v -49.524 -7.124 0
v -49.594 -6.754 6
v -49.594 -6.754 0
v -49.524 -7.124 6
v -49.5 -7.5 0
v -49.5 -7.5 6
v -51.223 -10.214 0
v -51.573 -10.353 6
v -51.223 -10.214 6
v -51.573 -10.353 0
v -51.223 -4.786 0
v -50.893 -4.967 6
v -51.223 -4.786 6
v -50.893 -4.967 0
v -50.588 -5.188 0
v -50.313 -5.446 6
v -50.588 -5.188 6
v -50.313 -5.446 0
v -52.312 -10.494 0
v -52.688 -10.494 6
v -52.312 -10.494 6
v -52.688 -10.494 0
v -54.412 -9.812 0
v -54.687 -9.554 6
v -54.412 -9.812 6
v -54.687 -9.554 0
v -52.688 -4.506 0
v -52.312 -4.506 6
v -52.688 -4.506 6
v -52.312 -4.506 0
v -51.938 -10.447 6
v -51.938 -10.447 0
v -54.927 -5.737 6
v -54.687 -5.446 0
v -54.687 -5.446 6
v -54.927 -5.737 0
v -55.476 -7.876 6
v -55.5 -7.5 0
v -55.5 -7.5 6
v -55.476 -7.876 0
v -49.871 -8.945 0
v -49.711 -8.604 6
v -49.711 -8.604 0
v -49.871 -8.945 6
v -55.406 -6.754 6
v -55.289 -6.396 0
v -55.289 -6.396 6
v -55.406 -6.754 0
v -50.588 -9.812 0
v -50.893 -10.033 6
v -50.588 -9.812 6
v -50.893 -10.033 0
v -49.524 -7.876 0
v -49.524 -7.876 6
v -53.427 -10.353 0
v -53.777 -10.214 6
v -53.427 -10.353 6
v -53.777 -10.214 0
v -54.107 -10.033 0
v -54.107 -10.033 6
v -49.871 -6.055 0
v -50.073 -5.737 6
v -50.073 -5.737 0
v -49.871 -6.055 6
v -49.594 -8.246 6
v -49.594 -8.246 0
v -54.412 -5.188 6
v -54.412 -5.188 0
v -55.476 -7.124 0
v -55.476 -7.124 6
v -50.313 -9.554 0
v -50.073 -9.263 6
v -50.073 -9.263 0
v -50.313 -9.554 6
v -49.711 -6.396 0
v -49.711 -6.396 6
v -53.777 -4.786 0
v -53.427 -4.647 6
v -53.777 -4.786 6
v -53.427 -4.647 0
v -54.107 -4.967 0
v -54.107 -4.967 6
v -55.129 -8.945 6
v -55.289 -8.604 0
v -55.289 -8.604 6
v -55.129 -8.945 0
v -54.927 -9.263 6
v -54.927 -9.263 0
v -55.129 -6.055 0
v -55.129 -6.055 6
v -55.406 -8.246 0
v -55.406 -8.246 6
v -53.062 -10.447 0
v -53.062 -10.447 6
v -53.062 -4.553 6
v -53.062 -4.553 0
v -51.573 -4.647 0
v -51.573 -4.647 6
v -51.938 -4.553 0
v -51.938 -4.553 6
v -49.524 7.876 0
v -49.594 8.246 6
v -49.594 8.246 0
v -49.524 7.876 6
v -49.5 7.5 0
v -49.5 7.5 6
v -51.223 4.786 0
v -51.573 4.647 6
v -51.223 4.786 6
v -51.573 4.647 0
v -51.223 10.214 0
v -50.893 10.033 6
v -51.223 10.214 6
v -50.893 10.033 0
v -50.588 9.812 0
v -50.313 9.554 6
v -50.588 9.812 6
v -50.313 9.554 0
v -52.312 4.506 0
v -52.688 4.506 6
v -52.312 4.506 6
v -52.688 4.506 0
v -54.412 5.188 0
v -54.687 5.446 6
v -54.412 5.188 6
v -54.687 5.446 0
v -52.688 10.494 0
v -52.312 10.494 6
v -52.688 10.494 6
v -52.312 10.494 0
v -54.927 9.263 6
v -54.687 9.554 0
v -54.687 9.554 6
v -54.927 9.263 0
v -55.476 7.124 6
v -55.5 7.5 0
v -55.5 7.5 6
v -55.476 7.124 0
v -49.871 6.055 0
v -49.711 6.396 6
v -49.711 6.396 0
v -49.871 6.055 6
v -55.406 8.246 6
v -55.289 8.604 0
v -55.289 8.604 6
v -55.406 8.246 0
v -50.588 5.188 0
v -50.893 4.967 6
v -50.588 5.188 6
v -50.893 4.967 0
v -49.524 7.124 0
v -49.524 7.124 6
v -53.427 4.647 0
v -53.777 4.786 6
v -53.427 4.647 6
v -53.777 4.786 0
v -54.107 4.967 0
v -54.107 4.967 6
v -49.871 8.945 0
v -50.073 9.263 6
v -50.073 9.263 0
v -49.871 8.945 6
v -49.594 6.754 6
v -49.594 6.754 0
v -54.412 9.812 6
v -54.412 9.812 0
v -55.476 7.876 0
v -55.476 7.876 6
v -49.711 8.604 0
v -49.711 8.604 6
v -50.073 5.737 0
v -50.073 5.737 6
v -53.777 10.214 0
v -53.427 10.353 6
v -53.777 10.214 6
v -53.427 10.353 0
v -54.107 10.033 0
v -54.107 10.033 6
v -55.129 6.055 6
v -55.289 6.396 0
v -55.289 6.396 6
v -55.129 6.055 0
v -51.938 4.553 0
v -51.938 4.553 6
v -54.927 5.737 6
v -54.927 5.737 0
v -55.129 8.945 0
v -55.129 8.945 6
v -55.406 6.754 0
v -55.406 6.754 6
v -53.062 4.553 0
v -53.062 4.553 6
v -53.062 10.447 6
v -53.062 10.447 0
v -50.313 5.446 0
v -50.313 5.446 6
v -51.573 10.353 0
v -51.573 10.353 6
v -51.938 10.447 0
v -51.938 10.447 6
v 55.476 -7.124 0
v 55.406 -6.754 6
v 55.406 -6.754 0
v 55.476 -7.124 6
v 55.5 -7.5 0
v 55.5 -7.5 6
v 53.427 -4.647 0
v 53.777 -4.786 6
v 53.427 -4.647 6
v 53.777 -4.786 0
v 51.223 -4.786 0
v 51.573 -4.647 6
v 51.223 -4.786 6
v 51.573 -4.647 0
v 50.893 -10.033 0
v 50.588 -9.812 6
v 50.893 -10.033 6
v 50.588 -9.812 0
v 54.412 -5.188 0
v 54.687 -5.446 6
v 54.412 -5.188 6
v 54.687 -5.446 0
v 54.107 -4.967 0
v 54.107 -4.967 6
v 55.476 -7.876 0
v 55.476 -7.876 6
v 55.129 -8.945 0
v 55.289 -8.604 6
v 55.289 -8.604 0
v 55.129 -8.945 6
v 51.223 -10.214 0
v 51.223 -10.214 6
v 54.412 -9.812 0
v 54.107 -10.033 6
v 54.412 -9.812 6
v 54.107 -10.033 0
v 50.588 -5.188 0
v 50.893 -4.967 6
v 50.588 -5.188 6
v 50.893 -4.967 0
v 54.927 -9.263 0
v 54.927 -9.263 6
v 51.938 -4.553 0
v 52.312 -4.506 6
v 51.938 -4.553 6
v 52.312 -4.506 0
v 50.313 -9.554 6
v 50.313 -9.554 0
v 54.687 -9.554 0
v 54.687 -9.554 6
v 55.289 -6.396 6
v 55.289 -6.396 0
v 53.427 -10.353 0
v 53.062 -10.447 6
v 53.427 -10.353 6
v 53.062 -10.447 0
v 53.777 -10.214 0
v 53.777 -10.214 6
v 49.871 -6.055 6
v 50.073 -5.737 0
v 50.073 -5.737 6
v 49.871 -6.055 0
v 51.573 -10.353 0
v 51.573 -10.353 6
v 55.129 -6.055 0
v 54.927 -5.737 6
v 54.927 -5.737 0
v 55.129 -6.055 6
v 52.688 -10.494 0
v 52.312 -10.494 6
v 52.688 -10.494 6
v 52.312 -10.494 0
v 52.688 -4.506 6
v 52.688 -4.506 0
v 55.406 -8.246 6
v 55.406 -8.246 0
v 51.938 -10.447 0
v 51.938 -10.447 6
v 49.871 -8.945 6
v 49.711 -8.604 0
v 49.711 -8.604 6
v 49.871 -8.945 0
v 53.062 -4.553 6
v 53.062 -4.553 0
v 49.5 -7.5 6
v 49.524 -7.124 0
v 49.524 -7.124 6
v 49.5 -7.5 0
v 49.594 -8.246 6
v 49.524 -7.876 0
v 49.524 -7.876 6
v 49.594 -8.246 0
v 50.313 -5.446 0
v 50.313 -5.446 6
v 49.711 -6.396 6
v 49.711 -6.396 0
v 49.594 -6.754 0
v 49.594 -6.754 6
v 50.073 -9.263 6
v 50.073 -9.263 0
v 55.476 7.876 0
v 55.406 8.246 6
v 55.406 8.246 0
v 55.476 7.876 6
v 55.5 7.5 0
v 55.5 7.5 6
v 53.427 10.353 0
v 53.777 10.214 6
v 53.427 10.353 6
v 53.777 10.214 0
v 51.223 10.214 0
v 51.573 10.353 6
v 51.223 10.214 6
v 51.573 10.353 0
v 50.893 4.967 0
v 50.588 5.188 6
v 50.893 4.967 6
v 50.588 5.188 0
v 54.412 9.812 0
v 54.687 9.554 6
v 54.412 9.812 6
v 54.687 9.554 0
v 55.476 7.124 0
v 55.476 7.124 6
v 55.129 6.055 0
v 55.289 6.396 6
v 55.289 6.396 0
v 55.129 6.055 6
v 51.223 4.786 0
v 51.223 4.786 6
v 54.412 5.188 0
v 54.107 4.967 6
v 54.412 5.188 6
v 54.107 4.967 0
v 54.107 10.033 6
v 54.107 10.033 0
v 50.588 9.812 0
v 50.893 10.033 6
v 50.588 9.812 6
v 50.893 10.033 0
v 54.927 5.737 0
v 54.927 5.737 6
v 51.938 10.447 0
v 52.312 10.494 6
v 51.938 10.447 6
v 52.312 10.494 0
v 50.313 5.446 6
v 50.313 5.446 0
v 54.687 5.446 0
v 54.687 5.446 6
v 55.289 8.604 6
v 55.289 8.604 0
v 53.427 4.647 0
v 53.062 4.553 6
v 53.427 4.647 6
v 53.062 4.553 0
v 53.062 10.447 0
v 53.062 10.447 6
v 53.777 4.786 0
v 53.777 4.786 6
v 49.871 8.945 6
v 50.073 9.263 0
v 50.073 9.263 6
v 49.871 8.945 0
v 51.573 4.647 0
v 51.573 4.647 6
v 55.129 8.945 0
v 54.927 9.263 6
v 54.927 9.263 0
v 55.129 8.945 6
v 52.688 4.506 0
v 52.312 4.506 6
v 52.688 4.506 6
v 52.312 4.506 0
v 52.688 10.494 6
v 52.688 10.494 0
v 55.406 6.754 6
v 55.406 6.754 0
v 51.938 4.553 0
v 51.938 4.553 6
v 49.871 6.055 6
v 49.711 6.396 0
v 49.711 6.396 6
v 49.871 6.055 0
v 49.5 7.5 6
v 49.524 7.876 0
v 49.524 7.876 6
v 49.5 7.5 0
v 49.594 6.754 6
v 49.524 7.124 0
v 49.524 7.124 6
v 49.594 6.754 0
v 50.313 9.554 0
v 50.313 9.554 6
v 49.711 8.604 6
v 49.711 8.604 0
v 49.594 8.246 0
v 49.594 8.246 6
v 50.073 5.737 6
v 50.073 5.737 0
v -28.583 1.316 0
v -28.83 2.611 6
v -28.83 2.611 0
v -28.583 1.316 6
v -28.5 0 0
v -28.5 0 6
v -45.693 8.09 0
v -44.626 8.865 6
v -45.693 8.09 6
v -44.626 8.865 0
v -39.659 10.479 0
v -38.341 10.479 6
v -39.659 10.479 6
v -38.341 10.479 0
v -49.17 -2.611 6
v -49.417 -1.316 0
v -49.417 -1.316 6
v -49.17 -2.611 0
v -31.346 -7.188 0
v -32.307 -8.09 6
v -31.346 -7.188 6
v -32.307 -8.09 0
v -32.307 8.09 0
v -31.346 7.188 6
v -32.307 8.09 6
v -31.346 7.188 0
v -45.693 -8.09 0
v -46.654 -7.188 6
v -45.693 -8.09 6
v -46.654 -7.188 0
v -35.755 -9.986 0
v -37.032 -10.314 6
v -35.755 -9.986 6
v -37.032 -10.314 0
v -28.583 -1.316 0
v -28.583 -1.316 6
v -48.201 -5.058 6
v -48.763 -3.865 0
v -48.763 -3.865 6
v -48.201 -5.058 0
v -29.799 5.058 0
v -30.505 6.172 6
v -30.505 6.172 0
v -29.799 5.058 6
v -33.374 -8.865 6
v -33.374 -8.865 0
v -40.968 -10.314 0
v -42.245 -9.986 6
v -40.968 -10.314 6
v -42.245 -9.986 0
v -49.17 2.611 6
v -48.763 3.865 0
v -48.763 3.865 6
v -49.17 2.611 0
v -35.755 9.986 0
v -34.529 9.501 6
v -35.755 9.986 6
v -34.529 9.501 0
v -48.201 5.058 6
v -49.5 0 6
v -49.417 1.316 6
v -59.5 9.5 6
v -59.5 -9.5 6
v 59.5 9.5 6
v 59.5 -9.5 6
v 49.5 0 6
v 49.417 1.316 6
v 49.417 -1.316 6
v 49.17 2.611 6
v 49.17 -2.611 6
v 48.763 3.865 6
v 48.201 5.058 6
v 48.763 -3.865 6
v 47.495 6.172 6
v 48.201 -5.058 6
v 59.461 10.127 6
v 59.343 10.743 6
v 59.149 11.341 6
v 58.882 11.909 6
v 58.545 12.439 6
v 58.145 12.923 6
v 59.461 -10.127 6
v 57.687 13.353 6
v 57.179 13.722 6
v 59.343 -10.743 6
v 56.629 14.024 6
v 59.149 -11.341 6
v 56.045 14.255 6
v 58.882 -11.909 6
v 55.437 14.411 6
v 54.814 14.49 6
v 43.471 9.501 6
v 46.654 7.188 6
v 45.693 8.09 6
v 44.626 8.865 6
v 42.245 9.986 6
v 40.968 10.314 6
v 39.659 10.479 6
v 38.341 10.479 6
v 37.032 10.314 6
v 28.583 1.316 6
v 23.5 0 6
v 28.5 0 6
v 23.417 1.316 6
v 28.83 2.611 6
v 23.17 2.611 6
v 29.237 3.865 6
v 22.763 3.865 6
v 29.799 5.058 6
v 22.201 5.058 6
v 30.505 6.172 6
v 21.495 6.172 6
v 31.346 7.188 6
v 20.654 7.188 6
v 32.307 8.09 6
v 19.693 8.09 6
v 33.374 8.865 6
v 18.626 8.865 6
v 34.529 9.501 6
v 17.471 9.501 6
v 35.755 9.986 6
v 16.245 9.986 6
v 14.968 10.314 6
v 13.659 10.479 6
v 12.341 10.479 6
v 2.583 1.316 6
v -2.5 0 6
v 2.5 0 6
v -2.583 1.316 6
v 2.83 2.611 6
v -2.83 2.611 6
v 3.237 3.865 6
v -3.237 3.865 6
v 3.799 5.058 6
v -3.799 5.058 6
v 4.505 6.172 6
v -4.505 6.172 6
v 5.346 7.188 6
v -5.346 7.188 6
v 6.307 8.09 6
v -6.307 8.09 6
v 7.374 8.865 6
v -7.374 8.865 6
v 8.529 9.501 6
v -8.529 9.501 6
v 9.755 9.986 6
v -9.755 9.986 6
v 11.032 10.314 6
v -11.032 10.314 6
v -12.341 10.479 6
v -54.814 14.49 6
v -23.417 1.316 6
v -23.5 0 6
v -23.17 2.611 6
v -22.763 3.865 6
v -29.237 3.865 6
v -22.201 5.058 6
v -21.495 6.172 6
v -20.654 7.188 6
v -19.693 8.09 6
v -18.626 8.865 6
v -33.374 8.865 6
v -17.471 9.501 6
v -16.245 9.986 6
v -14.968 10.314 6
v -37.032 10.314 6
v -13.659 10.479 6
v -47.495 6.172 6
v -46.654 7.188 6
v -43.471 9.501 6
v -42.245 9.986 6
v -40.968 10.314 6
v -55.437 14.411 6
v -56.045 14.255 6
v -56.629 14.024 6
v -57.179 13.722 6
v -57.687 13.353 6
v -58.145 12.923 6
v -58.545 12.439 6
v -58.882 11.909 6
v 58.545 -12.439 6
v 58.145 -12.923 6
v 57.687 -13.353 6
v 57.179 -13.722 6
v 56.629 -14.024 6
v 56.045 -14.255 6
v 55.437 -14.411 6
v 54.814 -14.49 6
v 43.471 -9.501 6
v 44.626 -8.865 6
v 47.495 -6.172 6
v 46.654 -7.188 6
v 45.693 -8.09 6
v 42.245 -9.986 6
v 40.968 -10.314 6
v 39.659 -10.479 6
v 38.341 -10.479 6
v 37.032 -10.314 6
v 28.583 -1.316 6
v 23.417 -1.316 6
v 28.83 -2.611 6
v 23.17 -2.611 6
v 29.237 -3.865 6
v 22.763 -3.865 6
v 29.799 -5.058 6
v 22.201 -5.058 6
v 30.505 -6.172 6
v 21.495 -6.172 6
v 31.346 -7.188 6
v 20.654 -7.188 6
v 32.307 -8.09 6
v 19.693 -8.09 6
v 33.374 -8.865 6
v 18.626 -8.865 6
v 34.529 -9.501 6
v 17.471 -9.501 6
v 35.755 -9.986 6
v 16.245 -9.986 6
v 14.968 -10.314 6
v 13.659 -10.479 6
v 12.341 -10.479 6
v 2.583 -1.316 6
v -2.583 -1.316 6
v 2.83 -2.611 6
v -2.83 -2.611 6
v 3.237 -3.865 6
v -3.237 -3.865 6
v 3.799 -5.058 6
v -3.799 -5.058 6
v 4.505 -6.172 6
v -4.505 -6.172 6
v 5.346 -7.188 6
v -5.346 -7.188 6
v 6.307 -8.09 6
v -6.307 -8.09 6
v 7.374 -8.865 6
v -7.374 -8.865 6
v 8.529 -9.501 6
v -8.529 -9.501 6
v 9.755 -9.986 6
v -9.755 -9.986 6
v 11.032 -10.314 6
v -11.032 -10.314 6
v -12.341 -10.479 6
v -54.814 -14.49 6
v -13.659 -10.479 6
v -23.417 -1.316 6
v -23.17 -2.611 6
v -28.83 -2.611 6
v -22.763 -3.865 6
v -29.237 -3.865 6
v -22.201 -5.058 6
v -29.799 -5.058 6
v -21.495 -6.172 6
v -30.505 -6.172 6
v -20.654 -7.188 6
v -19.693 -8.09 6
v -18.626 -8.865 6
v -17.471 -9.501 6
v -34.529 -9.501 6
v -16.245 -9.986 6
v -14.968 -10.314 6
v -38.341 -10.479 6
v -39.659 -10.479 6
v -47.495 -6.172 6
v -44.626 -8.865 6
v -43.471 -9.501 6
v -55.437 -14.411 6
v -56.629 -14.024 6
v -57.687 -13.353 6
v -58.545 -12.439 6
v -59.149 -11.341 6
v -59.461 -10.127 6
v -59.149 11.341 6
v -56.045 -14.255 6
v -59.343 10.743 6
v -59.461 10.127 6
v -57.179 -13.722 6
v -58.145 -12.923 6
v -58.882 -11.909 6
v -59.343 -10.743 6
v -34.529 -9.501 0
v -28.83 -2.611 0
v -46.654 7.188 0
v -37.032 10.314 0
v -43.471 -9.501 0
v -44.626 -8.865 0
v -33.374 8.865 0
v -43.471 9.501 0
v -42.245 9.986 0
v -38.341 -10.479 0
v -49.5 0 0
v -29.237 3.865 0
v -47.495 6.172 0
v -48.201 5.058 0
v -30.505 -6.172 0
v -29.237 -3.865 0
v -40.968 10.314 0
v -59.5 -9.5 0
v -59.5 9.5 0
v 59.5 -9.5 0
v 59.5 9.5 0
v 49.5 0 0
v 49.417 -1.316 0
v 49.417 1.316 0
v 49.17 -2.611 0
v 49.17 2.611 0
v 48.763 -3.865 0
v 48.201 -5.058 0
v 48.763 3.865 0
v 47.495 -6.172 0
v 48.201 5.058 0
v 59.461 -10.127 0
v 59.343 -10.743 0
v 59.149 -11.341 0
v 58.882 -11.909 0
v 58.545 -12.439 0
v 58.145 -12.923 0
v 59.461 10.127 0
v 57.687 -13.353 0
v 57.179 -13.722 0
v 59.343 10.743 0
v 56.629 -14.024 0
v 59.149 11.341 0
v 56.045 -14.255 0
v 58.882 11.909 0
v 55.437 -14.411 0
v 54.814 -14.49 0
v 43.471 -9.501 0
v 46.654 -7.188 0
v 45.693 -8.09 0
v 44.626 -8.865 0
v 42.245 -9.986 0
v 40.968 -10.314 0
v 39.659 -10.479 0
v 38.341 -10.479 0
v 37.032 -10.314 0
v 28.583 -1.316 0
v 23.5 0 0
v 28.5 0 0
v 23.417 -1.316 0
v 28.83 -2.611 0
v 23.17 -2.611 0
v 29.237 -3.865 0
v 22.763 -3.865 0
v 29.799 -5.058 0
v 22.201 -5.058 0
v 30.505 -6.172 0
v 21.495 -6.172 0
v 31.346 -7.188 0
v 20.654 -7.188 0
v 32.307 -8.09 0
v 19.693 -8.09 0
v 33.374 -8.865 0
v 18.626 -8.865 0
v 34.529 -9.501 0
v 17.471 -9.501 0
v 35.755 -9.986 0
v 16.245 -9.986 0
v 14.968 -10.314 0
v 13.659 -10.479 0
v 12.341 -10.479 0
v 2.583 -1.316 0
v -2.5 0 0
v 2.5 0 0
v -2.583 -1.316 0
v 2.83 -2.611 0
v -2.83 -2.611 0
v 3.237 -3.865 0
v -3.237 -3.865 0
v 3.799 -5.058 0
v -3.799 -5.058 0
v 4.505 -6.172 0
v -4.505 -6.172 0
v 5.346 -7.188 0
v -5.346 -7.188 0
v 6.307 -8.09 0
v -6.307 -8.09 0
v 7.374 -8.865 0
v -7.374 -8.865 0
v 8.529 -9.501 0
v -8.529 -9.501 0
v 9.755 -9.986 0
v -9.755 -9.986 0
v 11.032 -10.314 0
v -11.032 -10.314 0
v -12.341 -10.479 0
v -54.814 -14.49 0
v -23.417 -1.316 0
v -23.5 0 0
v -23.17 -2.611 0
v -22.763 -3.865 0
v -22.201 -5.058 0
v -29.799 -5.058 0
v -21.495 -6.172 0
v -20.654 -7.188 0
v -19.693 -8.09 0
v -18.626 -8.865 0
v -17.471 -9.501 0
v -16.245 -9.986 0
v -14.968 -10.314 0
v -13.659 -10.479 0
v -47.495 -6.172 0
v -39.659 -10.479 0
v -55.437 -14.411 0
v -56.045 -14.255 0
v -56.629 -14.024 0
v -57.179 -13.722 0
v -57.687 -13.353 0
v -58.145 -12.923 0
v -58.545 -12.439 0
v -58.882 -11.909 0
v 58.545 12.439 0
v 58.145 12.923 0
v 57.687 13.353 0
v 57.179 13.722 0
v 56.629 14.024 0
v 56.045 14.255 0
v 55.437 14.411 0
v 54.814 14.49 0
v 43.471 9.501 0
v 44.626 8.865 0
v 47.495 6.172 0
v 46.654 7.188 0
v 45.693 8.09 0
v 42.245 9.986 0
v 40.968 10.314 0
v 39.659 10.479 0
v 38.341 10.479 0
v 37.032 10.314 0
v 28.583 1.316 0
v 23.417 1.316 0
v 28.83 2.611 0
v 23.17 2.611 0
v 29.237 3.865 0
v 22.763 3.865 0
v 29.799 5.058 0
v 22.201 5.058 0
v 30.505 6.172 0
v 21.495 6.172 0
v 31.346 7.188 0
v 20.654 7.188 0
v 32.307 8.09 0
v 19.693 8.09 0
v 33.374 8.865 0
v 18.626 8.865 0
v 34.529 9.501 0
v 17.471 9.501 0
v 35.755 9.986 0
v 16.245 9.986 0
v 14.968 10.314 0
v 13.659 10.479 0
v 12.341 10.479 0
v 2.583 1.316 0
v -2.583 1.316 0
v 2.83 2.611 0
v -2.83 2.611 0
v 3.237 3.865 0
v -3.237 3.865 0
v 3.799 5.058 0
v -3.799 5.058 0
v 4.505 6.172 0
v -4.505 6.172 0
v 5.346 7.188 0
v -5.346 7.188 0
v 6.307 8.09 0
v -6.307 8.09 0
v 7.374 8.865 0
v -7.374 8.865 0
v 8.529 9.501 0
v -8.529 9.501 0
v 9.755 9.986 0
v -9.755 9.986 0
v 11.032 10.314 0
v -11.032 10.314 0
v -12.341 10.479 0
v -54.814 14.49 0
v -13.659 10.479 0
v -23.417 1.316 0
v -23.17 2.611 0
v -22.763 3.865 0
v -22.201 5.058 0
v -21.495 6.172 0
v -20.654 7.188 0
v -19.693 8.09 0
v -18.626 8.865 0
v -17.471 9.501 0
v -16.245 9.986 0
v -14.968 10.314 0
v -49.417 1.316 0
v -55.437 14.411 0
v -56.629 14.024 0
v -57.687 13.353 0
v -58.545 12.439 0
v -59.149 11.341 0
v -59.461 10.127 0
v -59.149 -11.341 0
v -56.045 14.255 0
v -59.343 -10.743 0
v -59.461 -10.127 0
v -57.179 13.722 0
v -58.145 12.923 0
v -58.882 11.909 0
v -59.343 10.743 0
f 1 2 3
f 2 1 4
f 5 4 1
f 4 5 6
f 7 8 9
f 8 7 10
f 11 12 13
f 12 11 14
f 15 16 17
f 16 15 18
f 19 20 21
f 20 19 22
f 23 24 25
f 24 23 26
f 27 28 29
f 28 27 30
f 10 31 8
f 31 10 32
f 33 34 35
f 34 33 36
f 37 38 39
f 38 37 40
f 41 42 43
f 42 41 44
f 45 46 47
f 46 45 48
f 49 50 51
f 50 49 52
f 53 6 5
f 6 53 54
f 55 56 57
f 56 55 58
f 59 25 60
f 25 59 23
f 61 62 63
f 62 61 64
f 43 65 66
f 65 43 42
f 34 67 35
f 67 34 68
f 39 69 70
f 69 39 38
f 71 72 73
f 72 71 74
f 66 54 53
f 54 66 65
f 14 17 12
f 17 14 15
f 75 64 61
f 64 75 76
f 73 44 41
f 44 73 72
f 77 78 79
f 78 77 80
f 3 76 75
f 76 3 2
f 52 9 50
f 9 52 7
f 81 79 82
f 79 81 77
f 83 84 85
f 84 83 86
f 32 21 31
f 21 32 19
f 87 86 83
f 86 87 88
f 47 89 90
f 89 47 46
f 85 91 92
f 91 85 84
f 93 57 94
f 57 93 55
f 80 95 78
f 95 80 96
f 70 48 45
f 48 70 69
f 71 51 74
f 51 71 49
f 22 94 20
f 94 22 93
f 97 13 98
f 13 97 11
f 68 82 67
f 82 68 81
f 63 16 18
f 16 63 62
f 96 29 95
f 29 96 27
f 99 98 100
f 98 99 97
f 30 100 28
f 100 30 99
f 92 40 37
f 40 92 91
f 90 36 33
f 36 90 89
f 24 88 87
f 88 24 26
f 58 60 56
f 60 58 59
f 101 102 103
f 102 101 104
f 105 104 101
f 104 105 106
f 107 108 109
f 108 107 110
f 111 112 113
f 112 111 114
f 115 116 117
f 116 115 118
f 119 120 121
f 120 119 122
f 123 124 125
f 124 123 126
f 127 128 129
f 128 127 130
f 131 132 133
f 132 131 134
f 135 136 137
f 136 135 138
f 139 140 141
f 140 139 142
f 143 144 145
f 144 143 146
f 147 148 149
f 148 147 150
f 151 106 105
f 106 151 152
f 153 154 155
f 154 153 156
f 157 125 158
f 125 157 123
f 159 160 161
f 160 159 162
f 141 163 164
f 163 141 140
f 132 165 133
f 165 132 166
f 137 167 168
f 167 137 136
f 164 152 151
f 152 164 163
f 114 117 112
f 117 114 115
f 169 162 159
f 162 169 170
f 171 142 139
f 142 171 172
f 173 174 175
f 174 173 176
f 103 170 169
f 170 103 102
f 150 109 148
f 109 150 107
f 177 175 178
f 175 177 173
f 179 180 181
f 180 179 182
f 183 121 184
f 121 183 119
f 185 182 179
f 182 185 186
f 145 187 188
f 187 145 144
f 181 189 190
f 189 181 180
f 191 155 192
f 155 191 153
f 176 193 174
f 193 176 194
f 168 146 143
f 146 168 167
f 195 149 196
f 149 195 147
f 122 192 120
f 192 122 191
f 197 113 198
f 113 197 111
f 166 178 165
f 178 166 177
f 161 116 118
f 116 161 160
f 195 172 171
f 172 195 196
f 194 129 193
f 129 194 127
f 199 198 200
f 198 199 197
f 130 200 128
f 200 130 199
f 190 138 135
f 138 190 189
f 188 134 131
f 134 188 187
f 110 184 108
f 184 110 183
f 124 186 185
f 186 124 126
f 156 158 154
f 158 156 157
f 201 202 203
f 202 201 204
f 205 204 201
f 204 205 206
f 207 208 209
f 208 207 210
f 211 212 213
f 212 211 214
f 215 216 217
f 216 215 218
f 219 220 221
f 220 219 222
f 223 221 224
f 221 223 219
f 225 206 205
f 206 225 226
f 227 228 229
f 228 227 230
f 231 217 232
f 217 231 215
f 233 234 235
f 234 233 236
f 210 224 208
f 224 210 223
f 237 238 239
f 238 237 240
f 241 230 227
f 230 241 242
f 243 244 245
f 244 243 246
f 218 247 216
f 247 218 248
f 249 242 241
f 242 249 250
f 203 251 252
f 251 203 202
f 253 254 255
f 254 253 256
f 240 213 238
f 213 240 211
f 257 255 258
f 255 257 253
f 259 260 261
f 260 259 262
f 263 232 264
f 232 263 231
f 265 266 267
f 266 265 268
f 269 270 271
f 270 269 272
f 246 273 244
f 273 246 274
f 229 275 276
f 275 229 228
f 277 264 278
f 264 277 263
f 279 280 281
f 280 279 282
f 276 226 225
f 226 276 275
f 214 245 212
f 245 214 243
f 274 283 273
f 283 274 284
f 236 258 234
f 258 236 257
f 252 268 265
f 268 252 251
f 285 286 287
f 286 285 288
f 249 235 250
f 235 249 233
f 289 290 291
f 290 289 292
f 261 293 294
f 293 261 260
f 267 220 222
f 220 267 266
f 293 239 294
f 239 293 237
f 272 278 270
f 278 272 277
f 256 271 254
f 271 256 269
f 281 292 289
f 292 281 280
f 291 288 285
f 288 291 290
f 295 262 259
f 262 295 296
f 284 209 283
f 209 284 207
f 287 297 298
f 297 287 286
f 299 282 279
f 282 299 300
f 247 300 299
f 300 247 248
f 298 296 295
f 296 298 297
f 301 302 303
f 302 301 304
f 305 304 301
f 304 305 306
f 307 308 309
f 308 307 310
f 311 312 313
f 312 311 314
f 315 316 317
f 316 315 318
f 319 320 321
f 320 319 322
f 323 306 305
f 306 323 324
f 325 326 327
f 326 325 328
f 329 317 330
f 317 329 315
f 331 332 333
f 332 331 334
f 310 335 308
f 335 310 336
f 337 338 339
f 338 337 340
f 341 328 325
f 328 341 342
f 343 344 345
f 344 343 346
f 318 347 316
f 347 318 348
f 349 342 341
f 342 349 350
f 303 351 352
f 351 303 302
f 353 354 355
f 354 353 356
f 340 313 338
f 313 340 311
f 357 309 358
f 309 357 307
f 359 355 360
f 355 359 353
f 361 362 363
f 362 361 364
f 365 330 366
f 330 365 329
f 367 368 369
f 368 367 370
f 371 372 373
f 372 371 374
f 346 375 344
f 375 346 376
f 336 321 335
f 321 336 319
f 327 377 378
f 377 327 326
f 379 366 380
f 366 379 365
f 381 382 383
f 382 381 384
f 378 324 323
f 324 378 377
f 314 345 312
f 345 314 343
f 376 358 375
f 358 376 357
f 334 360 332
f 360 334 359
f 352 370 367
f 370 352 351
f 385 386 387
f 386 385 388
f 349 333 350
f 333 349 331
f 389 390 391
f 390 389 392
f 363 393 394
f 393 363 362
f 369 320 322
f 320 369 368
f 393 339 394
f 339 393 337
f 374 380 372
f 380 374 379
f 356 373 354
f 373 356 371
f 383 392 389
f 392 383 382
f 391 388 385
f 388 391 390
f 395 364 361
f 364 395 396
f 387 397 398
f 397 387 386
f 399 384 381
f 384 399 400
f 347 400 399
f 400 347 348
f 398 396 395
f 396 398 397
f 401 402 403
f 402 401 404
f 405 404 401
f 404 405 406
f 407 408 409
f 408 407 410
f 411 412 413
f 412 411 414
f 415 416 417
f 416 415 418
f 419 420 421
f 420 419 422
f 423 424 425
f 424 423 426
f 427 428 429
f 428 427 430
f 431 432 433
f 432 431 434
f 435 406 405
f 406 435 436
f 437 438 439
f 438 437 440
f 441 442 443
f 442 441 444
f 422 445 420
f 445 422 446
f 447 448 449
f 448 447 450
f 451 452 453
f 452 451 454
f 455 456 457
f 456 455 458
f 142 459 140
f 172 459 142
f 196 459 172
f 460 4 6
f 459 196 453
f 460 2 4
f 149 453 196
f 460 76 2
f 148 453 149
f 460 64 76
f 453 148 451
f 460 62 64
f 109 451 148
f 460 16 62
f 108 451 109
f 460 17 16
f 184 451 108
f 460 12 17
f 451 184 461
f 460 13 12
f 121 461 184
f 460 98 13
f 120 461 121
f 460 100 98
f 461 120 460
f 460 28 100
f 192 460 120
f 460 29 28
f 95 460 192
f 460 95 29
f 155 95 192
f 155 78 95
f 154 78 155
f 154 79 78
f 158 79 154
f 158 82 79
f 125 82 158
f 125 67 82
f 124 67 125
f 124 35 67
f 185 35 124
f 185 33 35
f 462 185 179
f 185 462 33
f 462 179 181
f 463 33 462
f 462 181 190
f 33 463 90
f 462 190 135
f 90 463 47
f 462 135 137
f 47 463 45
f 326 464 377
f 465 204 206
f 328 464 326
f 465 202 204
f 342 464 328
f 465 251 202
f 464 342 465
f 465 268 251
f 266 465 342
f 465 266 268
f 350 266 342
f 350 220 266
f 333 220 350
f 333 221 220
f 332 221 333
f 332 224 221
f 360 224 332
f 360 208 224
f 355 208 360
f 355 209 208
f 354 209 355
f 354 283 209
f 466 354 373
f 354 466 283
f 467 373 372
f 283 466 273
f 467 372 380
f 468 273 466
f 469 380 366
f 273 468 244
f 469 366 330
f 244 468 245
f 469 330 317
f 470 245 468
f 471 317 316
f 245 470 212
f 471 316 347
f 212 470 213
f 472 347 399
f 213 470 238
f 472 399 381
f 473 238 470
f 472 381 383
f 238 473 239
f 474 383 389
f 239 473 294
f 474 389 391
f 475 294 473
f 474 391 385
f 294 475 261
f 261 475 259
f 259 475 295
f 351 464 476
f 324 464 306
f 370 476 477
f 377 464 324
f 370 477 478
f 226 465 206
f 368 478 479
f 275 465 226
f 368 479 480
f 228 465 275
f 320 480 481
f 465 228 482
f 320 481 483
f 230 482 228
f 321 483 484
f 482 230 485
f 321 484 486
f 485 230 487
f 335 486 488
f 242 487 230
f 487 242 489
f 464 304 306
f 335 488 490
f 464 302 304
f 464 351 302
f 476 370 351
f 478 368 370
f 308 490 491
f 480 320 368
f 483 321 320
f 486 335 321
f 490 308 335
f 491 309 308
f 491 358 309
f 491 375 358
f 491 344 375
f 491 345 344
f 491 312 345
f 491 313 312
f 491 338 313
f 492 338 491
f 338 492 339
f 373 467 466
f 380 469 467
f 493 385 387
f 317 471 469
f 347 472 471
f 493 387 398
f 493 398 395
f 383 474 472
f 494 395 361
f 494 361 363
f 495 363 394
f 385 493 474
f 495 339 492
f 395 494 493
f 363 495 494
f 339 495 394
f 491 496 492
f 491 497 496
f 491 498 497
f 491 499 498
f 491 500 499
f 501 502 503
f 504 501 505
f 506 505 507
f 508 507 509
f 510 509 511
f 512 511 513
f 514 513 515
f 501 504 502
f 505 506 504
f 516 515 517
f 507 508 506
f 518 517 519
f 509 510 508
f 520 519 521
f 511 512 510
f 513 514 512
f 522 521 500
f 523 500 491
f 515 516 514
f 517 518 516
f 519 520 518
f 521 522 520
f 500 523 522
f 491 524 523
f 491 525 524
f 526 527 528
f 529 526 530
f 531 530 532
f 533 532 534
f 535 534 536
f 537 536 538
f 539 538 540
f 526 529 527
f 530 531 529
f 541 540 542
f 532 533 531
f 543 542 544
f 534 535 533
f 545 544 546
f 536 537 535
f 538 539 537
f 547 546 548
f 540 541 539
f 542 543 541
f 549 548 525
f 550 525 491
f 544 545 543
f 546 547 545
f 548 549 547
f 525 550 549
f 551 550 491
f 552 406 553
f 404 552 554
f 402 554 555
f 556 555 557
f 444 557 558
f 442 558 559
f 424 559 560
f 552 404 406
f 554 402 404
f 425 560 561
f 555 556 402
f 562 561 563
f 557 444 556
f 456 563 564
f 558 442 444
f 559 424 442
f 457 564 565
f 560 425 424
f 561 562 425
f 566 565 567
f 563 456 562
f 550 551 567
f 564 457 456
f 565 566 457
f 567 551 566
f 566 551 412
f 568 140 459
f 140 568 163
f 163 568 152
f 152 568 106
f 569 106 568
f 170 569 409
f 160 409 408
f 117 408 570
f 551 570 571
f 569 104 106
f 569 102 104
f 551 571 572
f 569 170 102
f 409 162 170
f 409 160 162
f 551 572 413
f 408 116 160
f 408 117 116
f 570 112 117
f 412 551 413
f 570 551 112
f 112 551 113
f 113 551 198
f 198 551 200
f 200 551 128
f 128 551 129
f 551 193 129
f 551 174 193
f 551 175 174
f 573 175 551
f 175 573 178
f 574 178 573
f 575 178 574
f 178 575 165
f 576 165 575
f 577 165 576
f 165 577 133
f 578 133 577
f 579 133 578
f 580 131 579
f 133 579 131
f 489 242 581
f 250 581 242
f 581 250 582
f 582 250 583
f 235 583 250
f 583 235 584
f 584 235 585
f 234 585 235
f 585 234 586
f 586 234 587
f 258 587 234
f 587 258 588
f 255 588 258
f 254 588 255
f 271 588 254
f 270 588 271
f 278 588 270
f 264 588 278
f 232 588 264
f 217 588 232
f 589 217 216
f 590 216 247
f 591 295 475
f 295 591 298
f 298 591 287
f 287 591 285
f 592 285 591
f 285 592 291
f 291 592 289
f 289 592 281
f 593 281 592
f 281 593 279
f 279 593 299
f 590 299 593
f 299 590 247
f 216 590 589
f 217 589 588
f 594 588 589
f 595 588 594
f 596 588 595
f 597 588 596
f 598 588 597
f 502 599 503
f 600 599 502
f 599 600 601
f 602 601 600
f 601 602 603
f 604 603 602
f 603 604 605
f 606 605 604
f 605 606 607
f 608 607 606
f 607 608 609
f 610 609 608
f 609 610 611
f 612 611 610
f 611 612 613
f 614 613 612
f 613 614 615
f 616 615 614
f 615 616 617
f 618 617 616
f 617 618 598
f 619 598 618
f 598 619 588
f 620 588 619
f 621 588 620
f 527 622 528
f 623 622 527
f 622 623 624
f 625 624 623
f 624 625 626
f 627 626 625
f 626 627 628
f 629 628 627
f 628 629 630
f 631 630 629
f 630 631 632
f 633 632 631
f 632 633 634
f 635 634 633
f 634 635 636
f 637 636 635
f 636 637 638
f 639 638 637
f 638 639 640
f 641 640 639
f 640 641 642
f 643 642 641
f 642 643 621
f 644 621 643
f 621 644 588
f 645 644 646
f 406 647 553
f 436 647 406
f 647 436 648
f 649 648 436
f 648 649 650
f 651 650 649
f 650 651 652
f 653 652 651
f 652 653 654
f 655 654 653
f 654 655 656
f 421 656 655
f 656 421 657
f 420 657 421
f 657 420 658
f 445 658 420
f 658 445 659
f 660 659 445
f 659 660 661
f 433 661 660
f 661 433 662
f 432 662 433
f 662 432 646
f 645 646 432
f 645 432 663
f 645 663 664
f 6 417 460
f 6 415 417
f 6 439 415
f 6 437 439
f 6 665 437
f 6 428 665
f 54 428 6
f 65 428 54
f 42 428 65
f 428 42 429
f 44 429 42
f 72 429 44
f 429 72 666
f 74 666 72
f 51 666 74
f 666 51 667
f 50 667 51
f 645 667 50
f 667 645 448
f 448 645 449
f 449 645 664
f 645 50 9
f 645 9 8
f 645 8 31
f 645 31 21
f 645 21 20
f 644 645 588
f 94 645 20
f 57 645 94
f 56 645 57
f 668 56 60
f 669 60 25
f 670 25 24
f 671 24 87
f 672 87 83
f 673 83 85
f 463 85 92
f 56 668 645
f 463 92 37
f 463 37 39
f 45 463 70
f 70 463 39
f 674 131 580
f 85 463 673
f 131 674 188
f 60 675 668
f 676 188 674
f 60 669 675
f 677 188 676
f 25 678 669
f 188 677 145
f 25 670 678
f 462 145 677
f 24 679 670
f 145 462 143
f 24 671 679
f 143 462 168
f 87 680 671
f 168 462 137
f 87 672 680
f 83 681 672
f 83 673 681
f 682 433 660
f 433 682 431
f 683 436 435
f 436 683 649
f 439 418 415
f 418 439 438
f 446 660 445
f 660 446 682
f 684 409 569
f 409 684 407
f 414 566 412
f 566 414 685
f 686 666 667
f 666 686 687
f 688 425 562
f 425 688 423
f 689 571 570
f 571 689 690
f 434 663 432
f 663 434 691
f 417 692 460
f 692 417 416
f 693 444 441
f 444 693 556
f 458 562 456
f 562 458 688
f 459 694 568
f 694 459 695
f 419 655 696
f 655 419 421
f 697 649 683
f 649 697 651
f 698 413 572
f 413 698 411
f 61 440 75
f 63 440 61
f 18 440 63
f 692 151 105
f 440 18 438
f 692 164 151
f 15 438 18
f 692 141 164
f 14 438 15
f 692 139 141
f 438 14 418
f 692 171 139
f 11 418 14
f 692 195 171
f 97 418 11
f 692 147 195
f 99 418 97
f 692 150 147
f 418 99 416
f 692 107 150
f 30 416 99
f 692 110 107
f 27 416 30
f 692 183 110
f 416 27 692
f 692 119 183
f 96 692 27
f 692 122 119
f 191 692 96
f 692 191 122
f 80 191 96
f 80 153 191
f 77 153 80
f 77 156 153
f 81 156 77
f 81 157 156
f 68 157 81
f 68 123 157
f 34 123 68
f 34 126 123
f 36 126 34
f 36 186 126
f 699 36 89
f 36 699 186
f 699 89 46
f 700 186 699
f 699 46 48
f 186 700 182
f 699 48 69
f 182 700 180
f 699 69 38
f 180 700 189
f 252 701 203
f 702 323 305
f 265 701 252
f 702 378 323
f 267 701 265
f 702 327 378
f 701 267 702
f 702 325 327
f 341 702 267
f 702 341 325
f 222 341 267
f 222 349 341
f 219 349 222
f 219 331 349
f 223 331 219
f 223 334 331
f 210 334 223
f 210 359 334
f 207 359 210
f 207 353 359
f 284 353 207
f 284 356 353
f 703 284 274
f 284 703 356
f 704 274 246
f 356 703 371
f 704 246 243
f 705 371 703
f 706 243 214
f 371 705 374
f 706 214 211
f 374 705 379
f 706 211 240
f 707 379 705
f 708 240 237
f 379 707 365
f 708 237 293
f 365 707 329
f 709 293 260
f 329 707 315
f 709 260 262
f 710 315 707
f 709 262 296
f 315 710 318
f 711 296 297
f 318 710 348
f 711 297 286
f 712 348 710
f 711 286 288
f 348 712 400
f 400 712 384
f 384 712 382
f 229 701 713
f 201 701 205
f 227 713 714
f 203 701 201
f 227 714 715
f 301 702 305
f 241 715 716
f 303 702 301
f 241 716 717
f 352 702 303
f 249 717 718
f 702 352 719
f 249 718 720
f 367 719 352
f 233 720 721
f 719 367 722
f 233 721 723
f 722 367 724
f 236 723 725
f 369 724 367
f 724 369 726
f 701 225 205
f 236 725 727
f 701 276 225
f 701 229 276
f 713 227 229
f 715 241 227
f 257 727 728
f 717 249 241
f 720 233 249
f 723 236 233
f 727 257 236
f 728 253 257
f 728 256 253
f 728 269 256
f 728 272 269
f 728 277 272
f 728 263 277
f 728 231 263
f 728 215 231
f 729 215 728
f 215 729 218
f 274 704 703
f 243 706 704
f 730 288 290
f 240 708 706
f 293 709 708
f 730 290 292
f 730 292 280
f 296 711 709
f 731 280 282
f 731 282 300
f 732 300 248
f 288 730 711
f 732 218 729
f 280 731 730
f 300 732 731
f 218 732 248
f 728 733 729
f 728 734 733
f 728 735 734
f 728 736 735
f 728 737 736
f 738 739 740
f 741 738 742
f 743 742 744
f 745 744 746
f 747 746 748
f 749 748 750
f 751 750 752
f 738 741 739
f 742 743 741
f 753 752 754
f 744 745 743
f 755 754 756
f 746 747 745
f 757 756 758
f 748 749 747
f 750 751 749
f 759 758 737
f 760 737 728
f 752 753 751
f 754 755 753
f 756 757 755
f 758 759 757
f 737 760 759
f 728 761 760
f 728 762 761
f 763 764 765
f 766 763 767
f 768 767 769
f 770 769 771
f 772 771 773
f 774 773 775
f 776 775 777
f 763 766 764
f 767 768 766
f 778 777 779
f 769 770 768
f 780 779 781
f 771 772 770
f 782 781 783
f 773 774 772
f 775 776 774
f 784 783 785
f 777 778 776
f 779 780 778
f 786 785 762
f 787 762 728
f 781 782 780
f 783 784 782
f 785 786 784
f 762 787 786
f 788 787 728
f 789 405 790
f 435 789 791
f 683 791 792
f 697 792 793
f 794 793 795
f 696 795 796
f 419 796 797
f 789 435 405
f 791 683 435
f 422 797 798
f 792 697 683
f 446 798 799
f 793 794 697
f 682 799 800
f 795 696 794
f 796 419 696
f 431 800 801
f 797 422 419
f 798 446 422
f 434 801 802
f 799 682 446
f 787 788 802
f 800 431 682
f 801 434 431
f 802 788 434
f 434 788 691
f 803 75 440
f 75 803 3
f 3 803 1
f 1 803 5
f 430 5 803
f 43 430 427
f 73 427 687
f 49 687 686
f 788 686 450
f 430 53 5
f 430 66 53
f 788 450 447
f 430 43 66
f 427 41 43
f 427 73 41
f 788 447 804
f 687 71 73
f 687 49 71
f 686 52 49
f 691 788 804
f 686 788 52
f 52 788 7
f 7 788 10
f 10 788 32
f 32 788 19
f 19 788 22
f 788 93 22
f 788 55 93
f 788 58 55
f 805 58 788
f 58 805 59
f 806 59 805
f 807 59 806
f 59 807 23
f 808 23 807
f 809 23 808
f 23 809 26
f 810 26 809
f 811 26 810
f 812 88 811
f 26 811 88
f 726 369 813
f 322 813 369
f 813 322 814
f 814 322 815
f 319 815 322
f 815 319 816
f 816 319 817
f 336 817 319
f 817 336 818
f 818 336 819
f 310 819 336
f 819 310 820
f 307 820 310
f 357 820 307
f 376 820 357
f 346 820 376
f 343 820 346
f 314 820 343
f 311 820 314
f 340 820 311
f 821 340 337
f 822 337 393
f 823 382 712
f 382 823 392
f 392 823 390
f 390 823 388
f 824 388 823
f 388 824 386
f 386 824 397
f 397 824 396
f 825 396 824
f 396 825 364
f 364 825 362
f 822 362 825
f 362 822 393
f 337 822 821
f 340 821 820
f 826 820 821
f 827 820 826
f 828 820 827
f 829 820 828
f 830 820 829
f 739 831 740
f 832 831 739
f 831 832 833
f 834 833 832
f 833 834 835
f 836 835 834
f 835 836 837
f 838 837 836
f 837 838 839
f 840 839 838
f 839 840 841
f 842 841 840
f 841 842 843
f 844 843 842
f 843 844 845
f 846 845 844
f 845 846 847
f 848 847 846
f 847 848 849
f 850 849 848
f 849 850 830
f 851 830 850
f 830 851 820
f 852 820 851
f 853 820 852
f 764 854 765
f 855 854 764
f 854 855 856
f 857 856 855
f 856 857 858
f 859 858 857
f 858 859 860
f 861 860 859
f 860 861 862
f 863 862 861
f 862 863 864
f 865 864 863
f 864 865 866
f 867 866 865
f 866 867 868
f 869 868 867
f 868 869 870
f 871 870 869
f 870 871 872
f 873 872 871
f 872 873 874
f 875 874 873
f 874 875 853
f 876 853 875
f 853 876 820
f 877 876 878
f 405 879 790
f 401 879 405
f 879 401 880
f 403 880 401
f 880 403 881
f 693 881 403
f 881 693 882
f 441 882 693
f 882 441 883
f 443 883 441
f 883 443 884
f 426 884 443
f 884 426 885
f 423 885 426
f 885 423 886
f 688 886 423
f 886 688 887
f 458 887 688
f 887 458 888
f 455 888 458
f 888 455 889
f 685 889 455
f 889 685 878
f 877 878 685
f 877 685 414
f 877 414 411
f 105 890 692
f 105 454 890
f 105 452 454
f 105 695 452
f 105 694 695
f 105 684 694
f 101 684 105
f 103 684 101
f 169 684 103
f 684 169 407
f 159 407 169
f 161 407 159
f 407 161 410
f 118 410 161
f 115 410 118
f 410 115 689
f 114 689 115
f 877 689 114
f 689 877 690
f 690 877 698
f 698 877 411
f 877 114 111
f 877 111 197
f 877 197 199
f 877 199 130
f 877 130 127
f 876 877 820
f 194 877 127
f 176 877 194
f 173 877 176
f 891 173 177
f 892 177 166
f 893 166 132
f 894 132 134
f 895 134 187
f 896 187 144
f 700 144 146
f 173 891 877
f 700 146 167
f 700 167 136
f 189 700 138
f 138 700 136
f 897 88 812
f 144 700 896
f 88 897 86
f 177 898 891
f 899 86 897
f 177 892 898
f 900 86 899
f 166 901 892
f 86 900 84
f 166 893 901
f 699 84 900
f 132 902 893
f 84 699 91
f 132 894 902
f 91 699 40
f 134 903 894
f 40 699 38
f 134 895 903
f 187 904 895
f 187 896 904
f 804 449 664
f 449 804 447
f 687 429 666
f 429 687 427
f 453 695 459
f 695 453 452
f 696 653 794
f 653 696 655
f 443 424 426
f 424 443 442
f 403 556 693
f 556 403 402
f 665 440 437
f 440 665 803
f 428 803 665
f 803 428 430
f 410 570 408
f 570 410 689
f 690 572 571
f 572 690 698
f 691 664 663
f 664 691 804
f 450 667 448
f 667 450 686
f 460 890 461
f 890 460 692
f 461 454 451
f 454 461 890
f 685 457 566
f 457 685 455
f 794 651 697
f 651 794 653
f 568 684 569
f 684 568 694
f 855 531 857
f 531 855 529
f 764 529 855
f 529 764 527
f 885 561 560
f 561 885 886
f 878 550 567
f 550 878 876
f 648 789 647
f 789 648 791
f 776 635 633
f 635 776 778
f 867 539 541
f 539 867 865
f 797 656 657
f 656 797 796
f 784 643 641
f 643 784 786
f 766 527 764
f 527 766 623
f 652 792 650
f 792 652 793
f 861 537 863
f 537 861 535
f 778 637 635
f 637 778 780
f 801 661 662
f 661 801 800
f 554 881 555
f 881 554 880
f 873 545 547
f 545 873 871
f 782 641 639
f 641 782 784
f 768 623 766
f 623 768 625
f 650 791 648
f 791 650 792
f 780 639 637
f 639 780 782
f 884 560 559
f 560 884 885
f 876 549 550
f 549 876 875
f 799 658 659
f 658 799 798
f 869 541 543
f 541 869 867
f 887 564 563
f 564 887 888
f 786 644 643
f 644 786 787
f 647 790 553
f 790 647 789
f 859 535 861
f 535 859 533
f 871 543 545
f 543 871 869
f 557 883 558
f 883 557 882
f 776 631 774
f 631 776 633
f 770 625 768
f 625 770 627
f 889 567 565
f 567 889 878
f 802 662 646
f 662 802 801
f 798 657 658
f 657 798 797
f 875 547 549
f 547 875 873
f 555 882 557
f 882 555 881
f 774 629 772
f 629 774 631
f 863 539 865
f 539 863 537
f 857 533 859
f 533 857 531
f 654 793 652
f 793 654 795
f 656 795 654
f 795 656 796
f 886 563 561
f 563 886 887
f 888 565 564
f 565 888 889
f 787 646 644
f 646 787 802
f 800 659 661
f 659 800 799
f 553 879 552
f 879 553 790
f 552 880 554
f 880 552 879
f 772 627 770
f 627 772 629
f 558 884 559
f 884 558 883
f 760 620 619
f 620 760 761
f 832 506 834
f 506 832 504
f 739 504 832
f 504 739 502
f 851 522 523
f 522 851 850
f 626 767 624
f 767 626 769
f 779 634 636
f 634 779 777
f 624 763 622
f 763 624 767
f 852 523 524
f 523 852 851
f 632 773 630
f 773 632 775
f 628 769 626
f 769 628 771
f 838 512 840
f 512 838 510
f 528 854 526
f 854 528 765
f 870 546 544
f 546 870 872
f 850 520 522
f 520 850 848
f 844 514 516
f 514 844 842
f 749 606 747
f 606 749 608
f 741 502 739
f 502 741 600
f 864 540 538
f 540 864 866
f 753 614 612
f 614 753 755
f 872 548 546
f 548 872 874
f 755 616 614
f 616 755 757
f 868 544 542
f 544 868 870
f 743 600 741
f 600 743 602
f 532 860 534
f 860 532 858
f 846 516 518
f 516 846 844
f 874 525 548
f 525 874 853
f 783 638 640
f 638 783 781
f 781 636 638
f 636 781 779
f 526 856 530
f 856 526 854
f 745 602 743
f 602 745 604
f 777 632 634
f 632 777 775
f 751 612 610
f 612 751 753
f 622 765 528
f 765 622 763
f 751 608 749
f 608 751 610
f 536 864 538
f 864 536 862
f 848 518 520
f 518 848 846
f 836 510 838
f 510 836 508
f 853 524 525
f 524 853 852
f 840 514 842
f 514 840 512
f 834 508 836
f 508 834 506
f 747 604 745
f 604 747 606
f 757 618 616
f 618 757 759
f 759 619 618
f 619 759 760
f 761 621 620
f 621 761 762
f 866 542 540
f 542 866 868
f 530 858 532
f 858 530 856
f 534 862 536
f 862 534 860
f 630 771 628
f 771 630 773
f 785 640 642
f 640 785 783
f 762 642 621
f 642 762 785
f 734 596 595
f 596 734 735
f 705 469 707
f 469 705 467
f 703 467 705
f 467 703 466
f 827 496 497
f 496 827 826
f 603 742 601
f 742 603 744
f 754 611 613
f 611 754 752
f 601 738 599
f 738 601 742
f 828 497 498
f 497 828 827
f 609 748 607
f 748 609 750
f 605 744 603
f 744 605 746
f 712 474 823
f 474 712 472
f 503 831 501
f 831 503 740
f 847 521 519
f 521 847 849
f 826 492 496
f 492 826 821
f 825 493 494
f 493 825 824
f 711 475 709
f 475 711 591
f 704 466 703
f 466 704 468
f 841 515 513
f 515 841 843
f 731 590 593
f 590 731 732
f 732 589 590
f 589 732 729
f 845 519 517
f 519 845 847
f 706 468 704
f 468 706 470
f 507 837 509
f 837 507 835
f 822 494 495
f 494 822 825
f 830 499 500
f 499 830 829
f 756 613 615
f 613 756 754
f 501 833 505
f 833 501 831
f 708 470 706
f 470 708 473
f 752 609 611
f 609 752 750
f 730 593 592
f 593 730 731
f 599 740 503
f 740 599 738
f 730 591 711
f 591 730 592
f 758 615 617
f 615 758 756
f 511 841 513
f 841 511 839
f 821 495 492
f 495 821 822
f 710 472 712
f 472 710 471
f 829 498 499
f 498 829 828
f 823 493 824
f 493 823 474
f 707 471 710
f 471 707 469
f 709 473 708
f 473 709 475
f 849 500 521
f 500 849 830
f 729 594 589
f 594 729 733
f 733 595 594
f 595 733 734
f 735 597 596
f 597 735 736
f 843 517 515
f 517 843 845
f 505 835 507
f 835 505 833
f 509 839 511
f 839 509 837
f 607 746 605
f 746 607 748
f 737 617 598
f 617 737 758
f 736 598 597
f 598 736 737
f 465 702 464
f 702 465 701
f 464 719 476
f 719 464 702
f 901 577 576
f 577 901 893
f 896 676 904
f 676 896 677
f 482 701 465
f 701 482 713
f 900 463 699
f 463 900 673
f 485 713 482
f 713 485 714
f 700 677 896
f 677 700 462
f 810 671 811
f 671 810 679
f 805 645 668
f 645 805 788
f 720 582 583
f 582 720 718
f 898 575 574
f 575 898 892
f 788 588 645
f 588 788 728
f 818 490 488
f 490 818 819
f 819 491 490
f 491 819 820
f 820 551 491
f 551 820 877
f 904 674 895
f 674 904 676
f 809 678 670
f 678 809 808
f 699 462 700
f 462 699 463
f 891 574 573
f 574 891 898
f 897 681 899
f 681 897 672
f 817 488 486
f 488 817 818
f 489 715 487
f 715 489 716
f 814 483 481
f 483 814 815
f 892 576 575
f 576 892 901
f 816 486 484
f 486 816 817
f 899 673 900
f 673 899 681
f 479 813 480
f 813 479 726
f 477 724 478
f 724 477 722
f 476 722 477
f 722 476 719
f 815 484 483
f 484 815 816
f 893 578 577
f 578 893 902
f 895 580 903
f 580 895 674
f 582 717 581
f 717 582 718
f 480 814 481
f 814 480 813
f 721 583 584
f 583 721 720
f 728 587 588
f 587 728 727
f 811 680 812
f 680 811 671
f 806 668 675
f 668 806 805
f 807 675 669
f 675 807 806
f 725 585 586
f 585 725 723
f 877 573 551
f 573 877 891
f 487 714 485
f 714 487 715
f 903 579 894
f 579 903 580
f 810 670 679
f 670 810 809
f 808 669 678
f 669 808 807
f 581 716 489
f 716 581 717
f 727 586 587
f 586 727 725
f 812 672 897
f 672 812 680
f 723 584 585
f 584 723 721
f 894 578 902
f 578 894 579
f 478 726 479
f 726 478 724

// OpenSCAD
$fn = 50;


difference() {
	union() {
		hull() {
			translate(v = [-54.5000000000, 9.5000000000, 0]) {
				cylinder(h = 6, r = 5);
			}
			translate(v = [54.5000000000, 9.5000000000, 0]) {
				cylinder(h = 6, r = 5);
			}
			translate(v = [-54.5000000000, -9.5000000000, 0]) {
				cylinder(h = 6, r = 5);
			}
			translate(v = [54.5000000000, -9.5000000000, 0]) {
				cylinder(h = 6, r = 5);
			}
		}
	}
	union() {
		#translate(v = [-52.5000000000, -7.5000000000, -100.0000000000]) {
			cylinder(h = 200, r = 3.0000000000);
		}
		#translate(v = [-52.5000000000, 7.5000000000, -100.0000000000]) {
			cylinder(h = 200, r = 3.0000000000);
		}
		#translate(v = [52.5000000000, -7.5000000000, -100.0000000000]) {
			cylinder(h = 200, r = 3.0000000000);
		}
		#translate(v = [52.5000000000, 7.5000000000, -100.0000000000]) {
			cylinder(h = 200, r = 3.0000000000);
		}
		#translate(v = [-39.0000000000, 0, 0]) {
			cylinder(h = 6, r = 10.5000000000);
		}
		#translate(v = [-13.0000000000, 0, 0]) {
			cylinder(h = 6, r = 10.5000000000);
		}
		#translate(v = [13.0000000000, 0, 0]) {
			cylinder(h = 6, r = 10.5000000000);
		}
		#translate(v = [39.0000000000, 0, 0]) {
			cylinder(h = 6, r = 10.5000000000);
		}
	}
}
